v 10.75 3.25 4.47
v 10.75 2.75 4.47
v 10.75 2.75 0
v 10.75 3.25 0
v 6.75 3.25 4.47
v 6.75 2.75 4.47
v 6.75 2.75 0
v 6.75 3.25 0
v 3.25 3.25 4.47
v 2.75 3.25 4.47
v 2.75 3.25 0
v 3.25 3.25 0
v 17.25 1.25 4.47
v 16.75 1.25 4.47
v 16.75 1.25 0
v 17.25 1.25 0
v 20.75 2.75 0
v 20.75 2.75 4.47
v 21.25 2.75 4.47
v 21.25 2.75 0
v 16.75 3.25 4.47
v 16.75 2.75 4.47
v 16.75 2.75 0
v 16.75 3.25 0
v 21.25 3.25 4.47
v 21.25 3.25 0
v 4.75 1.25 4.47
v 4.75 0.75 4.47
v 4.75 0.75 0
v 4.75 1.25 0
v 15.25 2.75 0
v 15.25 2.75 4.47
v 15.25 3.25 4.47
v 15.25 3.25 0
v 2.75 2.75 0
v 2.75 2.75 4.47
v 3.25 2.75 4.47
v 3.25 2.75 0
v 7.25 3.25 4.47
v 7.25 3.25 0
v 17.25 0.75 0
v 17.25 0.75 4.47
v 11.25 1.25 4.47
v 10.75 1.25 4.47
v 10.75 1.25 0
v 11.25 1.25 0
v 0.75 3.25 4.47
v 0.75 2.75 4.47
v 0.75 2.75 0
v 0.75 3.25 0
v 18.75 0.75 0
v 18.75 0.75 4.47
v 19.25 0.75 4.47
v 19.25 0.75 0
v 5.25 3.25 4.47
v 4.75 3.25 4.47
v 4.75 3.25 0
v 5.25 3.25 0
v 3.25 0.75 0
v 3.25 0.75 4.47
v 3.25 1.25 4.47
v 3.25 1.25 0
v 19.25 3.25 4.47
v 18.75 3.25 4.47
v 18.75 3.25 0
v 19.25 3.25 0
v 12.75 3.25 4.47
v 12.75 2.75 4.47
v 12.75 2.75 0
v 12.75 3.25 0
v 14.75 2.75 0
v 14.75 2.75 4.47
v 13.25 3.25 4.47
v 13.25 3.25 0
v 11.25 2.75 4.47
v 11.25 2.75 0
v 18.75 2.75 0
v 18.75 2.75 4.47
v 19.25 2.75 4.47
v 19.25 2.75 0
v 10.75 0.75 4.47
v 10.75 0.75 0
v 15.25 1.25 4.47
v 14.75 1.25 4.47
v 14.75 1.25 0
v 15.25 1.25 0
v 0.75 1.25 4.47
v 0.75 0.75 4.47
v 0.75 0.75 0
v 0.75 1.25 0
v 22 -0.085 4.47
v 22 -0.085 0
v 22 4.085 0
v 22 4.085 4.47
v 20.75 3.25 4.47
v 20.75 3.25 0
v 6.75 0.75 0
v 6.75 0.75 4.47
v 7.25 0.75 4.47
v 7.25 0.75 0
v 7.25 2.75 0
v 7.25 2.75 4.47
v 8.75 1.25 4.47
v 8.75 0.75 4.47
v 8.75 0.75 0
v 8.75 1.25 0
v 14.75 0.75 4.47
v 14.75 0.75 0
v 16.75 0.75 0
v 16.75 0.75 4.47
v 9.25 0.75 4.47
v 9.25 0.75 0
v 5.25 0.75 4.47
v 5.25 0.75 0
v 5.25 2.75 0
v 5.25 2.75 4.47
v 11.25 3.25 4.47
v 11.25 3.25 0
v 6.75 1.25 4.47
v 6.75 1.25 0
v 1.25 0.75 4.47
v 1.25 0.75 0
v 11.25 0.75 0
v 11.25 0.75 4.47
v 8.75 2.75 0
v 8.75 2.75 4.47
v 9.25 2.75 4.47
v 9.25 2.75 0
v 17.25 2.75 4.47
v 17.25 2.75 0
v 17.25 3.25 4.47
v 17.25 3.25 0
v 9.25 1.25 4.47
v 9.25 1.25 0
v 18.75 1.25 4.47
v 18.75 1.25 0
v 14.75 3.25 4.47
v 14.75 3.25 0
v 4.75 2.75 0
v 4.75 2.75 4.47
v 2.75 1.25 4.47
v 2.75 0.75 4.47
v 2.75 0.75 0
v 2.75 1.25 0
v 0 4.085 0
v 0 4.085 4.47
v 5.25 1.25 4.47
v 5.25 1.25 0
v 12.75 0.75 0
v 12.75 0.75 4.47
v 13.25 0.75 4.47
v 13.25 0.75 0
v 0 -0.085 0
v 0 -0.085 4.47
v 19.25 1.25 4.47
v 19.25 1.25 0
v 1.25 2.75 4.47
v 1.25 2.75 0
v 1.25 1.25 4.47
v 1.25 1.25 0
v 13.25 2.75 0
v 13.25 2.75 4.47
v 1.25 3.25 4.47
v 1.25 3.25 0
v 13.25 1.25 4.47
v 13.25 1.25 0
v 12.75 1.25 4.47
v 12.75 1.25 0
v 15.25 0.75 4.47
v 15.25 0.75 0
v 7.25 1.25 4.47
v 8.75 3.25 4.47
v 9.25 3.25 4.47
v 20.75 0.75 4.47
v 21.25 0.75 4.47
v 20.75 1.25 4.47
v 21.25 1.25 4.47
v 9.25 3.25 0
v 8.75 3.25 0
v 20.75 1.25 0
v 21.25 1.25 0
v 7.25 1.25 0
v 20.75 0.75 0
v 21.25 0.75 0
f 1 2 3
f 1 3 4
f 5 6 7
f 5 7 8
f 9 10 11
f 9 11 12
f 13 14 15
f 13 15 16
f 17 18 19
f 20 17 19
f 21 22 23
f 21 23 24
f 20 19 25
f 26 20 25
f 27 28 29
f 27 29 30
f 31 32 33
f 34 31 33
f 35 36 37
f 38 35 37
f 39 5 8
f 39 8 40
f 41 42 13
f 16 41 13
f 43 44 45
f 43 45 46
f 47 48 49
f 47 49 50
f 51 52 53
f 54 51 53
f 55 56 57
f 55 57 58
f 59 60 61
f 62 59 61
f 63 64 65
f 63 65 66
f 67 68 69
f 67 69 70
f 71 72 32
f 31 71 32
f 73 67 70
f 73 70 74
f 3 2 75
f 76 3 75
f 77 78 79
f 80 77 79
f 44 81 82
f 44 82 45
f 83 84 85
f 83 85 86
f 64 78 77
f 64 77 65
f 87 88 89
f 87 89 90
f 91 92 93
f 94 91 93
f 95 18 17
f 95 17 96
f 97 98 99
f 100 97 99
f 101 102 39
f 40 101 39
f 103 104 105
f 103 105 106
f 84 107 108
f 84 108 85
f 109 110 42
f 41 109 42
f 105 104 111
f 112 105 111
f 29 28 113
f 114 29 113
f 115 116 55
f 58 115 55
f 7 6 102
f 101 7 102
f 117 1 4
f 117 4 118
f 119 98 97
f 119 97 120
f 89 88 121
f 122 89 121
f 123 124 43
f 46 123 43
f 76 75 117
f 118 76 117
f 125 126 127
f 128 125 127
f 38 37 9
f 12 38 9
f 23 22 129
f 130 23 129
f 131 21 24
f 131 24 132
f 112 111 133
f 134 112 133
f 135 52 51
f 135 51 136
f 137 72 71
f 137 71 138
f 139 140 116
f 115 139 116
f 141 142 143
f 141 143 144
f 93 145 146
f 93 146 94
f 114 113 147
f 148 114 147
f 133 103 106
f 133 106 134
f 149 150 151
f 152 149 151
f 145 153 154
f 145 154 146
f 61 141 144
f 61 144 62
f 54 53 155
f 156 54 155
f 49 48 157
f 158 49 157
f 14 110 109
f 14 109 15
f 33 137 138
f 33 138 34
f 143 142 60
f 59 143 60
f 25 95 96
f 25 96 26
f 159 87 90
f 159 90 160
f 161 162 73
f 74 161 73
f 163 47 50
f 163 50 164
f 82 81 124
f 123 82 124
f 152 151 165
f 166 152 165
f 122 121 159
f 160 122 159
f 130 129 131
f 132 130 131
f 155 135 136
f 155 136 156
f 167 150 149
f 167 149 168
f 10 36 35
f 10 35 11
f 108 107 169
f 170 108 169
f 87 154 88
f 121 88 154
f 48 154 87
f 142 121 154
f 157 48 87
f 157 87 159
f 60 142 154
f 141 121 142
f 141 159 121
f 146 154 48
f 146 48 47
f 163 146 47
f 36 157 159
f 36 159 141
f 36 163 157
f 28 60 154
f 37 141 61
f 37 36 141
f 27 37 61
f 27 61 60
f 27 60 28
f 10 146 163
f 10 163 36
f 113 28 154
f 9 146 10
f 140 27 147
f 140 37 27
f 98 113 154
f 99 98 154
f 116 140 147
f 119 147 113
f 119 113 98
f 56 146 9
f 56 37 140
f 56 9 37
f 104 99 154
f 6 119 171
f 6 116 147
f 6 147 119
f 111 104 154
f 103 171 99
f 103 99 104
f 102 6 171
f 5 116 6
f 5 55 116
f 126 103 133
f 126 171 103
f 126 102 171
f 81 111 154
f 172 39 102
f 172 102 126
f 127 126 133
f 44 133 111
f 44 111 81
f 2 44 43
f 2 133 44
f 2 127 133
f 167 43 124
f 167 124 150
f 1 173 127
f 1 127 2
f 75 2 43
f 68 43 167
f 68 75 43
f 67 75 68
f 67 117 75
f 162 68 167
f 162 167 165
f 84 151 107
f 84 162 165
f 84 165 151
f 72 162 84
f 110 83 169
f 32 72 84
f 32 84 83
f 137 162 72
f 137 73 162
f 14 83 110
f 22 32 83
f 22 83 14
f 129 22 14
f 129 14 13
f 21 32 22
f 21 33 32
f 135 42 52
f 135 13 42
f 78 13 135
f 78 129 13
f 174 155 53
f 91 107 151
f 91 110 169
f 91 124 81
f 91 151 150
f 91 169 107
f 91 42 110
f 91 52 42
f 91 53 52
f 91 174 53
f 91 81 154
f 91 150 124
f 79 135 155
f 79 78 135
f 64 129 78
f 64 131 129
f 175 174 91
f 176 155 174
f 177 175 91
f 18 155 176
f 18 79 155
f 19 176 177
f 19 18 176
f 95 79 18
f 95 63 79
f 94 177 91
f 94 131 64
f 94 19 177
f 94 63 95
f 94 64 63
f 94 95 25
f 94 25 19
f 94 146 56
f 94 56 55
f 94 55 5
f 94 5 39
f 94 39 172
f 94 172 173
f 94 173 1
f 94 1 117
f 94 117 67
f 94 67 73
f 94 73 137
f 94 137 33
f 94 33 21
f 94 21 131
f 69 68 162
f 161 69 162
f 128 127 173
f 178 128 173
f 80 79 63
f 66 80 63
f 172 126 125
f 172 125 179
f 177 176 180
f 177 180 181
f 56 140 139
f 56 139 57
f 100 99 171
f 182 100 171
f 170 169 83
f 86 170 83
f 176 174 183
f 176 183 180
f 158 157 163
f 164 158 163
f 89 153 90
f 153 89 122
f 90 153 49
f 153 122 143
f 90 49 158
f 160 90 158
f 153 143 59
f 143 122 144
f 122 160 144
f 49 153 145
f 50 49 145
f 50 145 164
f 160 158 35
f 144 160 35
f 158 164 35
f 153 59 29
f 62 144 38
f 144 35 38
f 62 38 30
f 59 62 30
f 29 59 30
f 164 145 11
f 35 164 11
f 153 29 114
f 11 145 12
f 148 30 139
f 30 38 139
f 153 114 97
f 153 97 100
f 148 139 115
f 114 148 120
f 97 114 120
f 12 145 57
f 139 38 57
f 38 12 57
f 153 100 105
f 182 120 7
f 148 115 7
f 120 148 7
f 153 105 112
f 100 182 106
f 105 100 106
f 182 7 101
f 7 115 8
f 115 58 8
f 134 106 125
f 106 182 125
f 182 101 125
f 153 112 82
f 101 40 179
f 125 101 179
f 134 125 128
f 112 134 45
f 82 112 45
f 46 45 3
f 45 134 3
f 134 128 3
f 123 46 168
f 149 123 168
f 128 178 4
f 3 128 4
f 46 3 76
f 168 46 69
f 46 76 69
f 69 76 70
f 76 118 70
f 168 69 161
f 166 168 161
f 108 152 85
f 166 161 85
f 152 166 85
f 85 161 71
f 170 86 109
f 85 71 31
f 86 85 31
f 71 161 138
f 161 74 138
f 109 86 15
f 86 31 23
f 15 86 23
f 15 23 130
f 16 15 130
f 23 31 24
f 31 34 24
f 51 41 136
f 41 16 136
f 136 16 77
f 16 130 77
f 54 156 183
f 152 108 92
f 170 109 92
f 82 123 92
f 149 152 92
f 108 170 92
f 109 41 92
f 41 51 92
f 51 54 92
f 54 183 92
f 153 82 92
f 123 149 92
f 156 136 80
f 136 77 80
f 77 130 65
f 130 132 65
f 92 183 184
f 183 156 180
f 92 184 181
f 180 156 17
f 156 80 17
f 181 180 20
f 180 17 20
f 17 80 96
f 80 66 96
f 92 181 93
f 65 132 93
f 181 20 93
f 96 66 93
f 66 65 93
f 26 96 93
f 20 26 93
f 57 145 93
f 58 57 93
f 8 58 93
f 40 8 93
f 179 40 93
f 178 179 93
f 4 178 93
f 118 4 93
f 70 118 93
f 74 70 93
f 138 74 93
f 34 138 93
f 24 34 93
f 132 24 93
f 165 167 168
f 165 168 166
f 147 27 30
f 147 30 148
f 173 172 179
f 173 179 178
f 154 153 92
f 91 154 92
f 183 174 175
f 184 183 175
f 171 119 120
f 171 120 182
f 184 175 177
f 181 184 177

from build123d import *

# Parameters (mm, degrees)
SKETCH1_W           = 22
SKETCH1_H           = 4.17
BOSS_EXTRUDE1_DEPTH = 4.47
SKETCH2_W           = 0.5
SKETCH2_H           = 0.5
CUT_EXTRUDE1_DEPTH  = 4.47


with BuildPart() as part:
    # Sketch1 → Boss-Extrude1 (new body)
    with BuildSketch(Plane.XY):
        with Locations((11, 2)):
            Rectangle(SKETCH1_W, SKETCH1_H)
    extrude(amount=BOSS_EXTRUDE1_DEPTH)

    # Sketch2 → Cut-Extrude1 (cut)
    with BuildSketch(Plane.XY.offset(4.47)):
        with Locations((1, 1)):
            Rectangle(SKETCH2_W, SKETCH2_H)
        with Locations((3, 1)):
            Rectangle(SKETCH2_W, SKETCH2_H)
        with Locations((5, 1)):
            Rectangle(SKETCH2_W, SKETCH2_H)
        with Locations((7, 1)):
            Rectangle(SKETCH2_W, SKETCH2_H)
        with Locations((9, 1)):
            Rectangle(SKETCH2_W, SKETCH2_H)
        with Locations((11, 1)):
            Rectangle(SKETCH2_W, SKETCH2_H)
        with Locations((13, 1)):
            Rectangle(SKETCH2_W, SKETCH2_H)
        with Locations((15, 1)):
            Rectangle(SKETCH2_W, SKETCH2_H)
        with Locations((17, 1)):
            Rectangle(SKETCH2_W, SKETCH2_H)
        with Locations((19, 1)):
            Rectangle(SKETCH2_W, SKETCH2_H)
        with Locations((21, 1)):
            Rectangle(SKETCH2_W, SKETCH2_H)
        with Locations((1, 3)):
            Rectangle(SKETCH2_W, SKETCH2_H)
        with Locations((3, 3)):
            Rectangle(SKETCH2_W, SKETCH2_H)
        with Locations((5, 3)):
            Rectangle(SKETCH2_W, SKETCH2_H)
        with Locations((7, 3)):
            Rectangle(SKETCH2_W, SKETCH2_H)
        with Locations((9, 3)):
            Rectangle(SKETCH2_W, SKETCH2_H)
        with Locations((11, 3)):
            Rectangle(SKETCH2_W, SKETCH2_H)
        with Locations((13, 3)):
            Rectangle(SKETCH2_W, SKETCH2_H)
        with Locations((15, 3)):
            Rectangle(SKETCH2_W, SKETCH2_H)
        with Locations((17, 3)):
            Rectangle(SKETCH2_W, SKETCH2_H)
        with Locations((19, 3)):
            Rectangle(SKETCH2_W, SKETCH2_H)
        with Locations((21, 3)):
            Rectangle(SKETCH2_W, SKETCH2_H)
    extrude(amount=-CUT_EXTRUDE1_DEPTH, mode=Mode.SUBTRACT)


solid = part.part
